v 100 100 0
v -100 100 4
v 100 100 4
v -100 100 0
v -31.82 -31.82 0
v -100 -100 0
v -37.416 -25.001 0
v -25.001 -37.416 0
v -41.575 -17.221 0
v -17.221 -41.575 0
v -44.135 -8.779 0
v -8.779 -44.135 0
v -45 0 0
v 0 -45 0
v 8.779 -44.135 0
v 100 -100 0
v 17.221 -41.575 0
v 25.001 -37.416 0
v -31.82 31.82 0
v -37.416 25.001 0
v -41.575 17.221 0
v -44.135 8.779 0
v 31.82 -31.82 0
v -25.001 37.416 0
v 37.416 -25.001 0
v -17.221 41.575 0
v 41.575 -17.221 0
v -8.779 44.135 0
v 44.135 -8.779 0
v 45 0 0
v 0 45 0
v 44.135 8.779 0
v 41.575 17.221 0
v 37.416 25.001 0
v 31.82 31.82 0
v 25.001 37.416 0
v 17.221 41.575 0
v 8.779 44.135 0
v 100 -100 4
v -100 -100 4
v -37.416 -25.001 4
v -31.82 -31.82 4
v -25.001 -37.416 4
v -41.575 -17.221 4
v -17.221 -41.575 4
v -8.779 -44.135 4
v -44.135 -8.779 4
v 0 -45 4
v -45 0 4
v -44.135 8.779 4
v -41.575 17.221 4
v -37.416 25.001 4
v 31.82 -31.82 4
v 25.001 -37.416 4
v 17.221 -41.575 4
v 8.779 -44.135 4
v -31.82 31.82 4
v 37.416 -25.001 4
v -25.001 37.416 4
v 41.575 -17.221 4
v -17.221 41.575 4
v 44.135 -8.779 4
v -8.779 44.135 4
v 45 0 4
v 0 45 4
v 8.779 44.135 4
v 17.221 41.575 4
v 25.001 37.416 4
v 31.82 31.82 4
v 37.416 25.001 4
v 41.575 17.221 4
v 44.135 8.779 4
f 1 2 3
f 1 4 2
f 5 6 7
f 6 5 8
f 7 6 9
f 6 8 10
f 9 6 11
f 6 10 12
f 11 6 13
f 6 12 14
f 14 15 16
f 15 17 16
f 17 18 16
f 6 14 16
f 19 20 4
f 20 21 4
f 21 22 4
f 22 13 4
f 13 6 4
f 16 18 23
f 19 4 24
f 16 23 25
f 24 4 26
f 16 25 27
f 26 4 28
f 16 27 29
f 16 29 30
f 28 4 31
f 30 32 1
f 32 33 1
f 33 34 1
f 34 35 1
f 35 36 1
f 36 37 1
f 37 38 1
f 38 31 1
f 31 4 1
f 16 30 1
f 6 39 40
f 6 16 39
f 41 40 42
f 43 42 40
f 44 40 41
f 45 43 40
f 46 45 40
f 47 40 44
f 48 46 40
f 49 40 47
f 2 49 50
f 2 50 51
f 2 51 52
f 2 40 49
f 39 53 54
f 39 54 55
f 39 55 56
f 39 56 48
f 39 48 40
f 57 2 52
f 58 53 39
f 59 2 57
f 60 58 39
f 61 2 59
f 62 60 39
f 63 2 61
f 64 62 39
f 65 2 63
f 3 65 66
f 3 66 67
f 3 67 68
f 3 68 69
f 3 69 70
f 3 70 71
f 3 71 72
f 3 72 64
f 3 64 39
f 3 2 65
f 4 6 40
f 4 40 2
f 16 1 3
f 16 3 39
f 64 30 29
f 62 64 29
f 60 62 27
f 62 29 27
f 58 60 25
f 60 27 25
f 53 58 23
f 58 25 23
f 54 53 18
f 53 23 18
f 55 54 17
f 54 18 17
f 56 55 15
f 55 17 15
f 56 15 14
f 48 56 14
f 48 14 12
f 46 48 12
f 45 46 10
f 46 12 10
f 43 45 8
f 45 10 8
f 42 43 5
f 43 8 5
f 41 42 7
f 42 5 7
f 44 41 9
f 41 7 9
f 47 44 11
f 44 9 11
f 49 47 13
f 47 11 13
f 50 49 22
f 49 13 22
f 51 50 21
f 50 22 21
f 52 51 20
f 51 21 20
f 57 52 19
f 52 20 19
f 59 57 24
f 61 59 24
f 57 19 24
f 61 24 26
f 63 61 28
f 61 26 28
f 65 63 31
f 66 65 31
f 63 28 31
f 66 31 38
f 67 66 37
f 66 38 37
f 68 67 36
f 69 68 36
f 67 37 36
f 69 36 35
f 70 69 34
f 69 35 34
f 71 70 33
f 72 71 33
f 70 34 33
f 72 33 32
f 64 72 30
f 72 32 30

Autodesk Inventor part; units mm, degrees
ref_plane "YZ Plane" through (0, 0, 0) normal (1, 0, 0) x (0, 1, 0)
ref_plane "XZ Plane" through (0, 0, 0) normal (0, 1, 0) x (-1, 0, 0)
ref_plane "XY Plane" through (0, 0, 0) normal (0, 0, 1) x (1, 0, 0)
sketch "Sketch1" plane through (0, 0, 0) normal (0, 0, 1) x (1, 0, 0)
  line L0 (-100, 100) -> (100, 100)
  line L1 (100, 100) -> (100, -100)
  line L2 (100, -100) -> (-100, -100)
  line L3 (-100, -100) -> (-100, 100)
  line L4 (-100, 100) -> (100, -100) construction
  line L5 (100, 100) -> (-100, -100) construction
  point P0 (0, 0)
  dimension "d0" = 200
  dimension "d1" = 200
extrude "Plate1" add sketch "Sketch1" along normal blind 4
sketch "Sketch2" plane through (0, 0, 0) normal (0, 0, 1) x (1, 0, 0)
  circle A0 centre (0, 0) radius 45
  dimension "d3" = 90
extrude "Extrusion1" cut sketch "Sketch2" along normal blind 10
equation "\"d1\" = d0"
equation "\"d2\" = Thickness"
equation "\"BendRadius\" = Thickness"
equation "\"BendReliefWidth\" = Thickness"
equation "\"BendReliefDepth\" = 0.5 * Thickness"
equation "\"CornerReliefSize\" = 4 * Thickness"
equation "\"MinimumRemnant\" = 2 * Thickness"
equation "\"TransitionRadius\" = BendRadius"
equation "\"JacobiRadiusSize\" = BendRadius"
equation "\"GapSize\" = Thickness"
equation "\"Конус_Угол_продольный\" = 52.4deg"
equation "\"Конус_Угол_поперечный\" = 52deg"
equation "\"Конус_Дно_сторона\" = 200"
equation "\"Конус_ширина_по_оси\" = 1700"
equation "\"Thickness\" = 4"
properties part number "MSC 011 Cone IN bottom" material "Stainless Steel"
